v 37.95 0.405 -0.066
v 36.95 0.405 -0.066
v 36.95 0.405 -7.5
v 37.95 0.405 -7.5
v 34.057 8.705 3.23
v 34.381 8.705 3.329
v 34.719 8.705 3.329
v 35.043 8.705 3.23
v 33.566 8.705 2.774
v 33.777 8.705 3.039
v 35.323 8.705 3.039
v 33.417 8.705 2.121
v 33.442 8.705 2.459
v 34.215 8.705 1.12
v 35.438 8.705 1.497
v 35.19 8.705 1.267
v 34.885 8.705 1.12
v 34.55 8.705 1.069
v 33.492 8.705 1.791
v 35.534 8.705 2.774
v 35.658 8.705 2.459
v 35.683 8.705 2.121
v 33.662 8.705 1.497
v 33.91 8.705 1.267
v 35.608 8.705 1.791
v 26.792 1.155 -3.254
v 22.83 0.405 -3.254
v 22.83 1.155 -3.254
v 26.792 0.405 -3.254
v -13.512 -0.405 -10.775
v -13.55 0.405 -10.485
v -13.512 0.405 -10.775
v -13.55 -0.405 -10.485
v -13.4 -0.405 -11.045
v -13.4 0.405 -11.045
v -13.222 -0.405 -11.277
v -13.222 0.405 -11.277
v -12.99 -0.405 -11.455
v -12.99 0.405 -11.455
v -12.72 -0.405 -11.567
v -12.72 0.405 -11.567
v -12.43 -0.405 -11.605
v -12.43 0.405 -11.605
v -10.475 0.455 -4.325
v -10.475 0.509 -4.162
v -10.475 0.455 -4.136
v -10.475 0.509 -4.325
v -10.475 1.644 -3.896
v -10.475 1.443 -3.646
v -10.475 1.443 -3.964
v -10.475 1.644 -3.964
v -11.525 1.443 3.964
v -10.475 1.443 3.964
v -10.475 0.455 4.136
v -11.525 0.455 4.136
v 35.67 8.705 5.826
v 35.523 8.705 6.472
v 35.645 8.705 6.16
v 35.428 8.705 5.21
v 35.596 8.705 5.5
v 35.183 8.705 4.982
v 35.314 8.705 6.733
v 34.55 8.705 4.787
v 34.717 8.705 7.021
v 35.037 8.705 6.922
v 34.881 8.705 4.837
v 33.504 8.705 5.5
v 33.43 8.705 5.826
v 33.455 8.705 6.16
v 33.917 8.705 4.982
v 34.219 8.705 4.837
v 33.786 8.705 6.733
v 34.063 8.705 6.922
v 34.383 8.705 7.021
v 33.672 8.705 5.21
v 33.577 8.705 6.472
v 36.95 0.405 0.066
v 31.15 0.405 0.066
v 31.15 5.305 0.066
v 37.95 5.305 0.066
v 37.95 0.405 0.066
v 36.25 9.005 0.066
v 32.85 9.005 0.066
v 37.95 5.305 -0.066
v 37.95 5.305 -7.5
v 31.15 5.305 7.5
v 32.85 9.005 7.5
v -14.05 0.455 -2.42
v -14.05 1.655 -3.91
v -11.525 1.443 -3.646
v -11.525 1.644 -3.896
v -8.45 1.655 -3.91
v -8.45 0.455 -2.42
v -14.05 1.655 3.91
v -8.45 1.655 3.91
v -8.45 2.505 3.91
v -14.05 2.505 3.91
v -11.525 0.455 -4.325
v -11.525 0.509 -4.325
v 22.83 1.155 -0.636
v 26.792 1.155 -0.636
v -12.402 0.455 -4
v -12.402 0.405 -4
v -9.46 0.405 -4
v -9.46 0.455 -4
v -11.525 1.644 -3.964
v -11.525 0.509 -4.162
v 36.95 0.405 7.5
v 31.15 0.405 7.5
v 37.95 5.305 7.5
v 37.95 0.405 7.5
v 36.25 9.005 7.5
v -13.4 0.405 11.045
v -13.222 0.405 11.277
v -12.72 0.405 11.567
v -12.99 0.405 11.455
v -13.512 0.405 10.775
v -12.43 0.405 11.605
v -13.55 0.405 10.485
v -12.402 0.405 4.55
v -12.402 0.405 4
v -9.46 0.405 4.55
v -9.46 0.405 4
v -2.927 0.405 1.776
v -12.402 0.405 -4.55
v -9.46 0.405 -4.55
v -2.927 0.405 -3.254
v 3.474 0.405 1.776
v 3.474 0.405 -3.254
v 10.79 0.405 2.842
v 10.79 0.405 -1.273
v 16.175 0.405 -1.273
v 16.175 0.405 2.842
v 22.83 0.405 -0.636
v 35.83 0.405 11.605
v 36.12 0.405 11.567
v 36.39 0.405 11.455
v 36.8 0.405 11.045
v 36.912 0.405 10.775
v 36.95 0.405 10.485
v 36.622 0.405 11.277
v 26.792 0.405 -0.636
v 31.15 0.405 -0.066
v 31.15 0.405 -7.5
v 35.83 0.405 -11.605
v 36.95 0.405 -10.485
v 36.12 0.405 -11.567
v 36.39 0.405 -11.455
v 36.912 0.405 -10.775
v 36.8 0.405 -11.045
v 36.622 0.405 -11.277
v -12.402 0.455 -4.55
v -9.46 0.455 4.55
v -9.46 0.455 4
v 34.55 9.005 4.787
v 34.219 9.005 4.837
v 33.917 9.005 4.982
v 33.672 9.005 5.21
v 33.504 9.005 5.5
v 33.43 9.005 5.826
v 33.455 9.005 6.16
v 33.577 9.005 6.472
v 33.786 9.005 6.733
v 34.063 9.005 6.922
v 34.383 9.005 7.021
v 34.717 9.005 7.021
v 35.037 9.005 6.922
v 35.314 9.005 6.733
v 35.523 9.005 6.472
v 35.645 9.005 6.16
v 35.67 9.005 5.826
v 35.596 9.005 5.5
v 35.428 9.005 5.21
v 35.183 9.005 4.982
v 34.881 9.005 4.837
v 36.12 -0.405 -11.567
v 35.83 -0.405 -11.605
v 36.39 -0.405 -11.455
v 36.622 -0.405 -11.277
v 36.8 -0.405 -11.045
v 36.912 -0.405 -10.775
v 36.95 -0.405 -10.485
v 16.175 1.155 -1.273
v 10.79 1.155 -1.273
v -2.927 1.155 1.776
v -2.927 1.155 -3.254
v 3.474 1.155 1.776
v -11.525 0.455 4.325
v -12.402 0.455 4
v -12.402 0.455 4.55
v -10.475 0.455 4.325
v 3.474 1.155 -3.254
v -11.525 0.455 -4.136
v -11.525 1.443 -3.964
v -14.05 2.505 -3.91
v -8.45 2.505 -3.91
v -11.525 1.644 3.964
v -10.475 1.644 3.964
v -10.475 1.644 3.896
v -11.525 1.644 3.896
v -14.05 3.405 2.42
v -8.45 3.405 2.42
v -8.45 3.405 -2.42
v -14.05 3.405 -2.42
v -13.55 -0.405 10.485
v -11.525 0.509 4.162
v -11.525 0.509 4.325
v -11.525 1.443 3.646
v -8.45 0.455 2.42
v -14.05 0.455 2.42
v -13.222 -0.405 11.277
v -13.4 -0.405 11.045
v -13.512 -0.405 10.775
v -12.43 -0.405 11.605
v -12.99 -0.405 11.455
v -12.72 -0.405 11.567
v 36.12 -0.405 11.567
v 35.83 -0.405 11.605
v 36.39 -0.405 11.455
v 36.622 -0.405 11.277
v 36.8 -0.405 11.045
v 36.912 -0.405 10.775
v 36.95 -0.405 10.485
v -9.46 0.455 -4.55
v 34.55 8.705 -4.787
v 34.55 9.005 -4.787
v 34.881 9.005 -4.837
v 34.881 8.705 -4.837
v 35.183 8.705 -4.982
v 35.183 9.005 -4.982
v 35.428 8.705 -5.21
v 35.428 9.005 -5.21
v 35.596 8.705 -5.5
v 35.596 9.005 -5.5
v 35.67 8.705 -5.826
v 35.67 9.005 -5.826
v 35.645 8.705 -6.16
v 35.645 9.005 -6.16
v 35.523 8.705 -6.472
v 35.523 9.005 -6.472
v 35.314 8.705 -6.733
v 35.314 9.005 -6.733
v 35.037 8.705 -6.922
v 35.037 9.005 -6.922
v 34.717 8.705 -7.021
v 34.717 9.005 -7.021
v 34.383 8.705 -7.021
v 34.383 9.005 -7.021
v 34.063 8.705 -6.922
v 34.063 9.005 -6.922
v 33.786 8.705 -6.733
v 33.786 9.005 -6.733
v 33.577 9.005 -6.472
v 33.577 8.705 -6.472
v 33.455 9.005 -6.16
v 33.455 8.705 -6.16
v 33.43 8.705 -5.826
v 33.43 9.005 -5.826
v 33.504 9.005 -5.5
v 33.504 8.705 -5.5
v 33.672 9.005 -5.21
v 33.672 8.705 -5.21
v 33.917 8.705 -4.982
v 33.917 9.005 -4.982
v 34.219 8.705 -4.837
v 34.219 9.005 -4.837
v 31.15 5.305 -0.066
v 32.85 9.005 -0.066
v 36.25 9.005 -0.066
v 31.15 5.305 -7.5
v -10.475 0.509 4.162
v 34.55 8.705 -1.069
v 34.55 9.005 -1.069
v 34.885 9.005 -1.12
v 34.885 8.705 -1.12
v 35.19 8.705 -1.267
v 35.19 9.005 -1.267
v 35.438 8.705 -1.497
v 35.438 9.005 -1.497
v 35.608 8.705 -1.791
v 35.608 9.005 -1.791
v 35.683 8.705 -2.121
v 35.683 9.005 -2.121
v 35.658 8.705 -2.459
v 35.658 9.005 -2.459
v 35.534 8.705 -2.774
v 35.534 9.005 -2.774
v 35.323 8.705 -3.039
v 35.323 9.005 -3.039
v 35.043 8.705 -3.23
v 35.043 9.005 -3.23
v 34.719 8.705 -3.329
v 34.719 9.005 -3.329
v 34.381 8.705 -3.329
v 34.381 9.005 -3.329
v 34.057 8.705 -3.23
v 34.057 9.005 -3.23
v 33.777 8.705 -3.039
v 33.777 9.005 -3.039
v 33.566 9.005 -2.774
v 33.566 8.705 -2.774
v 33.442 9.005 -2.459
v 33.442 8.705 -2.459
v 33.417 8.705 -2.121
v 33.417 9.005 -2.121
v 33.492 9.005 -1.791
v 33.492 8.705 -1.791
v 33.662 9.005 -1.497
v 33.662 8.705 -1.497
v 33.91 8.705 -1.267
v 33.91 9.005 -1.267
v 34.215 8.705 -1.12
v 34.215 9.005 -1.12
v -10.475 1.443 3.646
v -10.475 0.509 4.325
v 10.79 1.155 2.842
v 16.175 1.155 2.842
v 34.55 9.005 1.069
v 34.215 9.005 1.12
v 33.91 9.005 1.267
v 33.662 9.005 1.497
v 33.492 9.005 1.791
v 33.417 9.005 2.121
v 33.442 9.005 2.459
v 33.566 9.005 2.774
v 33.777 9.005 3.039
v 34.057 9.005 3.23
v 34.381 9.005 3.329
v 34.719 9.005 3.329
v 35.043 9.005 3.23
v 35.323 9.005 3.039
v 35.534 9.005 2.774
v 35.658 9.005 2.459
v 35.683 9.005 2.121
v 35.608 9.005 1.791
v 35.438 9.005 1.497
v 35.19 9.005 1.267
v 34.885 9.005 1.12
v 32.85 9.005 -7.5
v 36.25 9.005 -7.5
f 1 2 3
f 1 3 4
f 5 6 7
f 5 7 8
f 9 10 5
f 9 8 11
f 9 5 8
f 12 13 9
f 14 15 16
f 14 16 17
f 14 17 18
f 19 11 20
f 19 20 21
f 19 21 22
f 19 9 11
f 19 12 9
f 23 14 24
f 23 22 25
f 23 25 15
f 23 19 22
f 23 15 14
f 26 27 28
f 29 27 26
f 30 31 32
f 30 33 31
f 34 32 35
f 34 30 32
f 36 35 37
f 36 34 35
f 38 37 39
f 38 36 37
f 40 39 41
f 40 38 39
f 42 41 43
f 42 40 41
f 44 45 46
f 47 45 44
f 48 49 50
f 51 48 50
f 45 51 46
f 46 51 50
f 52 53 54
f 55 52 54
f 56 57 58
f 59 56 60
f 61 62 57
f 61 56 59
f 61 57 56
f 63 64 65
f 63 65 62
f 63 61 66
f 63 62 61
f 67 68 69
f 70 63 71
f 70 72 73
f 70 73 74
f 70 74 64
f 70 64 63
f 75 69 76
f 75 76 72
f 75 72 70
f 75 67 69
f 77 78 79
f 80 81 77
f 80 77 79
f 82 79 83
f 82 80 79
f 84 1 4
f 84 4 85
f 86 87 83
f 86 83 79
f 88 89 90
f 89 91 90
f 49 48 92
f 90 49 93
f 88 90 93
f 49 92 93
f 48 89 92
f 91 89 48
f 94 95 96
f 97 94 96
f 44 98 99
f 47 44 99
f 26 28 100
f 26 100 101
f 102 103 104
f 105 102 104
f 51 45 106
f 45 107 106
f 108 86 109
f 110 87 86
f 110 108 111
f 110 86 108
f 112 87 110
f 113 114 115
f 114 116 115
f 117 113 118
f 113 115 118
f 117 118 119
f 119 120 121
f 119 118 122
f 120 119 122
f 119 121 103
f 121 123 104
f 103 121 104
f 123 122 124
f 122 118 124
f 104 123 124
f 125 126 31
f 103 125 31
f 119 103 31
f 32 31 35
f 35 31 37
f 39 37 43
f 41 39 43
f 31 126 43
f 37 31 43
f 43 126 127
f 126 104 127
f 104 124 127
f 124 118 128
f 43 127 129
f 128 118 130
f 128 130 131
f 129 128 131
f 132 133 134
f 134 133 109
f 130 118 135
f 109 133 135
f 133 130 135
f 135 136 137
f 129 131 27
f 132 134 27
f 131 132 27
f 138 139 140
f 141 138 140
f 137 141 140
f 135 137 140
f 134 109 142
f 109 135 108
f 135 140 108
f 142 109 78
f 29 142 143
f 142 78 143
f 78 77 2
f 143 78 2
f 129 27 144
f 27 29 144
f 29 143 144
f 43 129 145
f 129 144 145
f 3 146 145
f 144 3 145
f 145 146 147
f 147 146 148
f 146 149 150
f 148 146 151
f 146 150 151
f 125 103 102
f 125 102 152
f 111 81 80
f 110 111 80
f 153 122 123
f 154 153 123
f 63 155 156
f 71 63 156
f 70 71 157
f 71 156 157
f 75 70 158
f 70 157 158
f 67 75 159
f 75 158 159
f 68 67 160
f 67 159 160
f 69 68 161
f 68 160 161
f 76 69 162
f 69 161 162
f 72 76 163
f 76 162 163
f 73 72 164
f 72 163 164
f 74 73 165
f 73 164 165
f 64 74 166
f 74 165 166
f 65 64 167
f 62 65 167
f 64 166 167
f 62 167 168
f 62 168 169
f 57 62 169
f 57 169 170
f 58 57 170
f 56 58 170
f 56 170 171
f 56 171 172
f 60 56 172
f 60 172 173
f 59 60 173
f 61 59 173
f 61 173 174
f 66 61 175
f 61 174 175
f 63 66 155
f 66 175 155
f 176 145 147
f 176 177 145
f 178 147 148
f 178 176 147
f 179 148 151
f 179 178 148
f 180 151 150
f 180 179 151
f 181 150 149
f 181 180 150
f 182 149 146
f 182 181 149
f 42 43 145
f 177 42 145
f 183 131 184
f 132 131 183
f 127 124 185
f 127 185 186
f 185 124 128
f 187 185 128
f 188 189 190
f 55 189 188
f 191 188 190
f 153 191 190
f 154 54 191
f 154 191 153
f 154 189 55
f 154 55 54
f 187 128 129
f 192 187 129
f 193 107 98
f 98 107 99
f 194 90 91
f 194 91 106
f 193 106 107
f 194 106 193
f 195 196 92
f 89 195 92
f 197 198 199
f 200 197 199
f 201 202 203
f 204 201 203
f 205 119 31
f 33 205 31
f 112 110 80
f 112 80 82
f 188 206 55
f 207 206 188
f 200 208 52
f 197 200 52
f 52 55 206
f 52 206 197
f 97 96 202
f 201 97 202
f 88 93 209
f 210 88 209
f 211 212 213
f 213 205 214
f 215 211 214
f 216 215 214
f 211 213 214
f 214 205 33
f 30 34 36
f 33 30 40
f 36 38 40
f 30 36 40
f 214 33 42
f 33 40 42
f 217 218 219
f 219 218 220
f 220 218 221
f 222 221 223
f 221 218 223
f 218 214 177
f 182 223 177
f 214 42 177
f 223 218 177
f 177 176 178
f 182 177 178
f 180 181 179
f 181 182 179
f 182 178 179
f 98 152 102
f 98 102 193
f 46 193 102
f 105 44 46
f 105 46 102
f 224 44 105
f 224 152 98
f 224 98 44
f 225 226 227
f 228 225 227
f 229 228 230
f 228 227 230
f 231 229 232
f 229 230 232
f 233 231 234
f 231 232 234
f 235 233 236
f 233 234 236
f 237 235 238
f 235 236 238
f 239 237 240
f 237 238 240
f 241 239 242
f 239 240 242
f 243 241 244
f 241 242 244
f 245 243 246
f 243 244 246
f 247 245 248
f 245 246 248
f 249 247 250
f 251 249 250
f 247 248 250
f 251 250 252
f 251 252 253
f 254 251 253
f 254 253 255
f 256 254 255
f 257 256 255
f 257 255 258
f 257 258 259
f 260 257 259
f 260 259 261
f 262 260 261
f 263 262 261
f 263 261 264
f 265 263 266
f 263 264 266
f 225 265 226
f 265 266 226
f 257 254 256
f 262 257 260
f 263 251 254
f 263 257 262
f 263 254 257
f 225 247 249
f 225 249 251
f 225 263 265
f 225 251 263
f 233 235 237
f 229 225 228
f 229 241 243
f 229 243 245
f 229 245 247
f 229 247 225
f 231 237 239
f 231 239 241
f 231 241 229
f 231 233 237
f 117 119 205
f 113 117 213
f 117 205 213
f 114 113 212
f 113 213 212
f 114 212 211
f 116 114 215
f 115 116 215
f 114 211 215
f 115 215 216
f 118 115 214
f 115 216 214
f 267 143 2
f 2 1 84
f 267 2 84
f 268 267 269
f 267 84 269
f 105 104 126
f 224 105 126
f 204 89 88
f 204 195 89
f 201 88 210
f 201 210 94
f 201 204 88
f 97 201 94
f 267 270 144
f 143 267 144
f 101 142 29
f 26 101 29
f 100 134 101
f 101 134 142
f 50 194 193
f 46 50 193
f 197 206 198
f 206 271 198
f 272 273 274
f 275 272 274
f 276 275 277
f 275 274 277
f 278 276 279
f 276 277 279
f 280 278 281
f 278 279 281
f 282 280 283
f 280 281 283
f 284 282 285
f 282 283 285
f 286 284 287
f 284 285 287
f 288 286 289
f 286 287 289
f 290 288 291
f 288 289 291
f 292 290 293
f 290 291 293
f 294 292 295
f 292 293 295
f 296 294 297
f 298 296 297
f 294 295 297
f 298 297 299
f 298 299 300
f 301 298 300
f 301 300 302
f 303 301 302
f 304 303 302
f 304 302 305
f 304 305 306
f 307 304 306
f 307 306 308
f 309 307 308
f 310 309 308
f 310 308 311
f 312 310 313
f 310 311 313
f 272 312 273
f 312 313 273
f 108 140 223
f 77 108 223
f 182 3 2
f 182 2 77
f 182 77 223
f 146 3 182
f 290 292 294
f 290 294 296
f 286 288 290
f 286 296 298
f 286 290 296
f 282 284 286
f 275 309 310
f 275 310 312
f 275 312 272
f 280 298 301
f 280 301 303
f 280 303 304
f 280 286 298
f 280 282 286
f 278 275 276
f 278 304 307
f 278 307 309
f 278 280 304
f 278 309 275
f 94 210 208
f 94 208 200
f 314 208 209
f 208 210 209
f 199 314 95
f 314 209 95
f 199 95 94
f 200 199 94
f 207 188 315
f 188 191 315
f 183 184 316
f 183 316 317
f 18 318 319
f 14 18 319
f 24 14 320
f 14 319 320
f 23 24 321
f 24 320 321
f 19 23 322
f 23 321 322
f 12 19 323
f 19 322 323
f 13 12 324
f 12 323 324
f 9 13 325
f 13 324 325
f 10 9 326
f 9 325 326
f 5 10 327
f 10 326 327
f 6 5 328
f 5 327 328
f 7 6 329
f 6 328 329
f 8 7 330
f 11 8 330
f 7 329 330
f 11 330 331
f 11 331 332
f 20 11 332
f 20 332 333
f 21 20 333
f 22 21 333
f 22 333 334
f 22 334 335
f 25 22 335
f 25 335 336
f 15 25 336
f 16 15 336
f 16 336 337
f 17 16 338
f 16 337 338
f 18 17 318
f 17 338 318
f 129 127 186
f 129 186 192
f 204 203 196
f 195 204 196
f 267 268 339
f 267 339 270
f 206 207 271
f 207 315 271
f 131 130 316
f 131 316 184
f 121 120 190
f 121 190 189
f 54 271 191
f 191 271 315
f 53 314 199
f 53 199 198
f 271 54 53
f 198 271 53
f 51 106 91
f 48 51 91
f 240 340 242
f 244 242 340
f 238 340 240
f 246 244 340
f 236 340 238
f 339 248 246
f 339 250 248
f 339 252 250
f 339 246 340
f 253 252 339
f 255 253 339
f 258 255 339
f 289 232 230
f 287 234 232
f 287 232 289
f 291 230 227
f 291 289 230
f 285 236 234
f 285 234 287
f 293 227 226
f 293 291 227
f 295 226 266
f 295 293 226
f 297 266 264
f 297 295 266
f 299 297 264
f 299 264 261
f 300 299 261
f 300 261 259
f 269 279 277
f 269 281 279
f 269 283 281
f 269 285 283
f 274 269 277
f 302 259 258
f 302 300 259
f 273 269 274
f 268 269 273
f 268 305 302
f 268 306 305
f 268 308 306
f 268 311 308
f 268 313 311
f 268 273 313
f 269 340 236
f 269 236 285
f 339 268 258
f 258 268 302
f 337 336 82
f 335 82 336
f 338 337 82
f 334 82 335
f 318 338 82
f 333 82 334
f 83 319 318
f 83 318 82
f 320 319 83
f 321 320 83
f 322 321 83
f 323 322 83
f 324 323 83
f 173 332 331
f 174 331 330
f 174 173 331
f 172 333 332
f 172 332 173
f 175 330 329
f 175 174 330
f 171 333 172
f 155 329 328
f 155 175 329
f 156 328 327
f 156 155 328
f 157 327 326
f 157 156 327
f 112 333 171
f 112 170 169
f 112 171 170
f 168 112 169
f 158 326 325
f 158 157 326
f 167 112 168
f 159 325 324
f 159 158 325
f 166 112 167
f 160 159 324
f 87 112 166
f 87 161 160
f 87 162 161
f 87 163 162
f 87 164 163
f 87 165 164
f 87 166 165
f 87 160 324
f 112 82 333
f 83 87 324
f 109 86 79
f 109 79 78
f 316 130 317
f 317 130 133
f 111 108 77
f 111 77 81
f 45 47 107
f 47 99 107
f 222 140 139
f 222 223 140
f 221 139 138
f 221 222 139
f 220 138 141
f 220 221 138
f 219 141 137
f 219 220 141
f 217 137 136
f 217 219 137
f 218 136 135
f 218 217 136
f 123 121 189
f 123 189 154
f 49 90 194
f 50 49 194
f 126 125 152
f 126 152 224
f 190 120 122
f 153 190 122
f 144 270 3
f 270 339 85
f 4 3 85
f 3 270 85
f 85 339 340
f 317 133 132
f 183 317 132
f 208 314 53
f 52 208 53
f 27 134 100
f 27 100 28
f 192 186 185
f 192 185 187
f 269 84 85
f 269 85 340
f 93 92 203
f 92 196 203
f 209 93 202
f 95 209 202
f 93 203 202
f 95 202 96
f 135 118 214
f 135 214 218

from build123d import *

# Parameters (mm, degrees)
BOSS_EXTRUDE1_DEPTH      = 0.405
FILLET1_R                = 1.12
CHAMFER1_SIZE            = 0.5
SKETCH2_R                = 1.1
CUT_EXTRUDE1_DEPTH       = 16.574075414
BOSS_EXTRUDE2_DEPTH      = 0.5
BOSS_EXTRUDE2_DEPTH_BACK = 5.1
SKETCH4_W                = 2.941717286
SKETCH4_H                = 0.549853698
BOSS_EXTRUDE3_DEPTH      = 0.05
BOSS_EXTRUDE4_DEPTH      = 0.525
SKETCH6_R                = 0.577649515
CUT_EXTRUDE2_DEPTH       = 17.26947218
SKETCH7_W                = 50.5
SKETCH7_H                = 23.21
BOSS_EXTRUDE5_DEPTH      = 0.81
FILLET2_R                = 1.12
SKETCH8_W                = 6.401014247
SKETCH8_H                = 5.029368337
SKETCH8_W_2              = 5.38498024
SKETCH8_H_2              = 4.114937731
SKETCH8_W_3              = 3.96253263
SKETCH8_H_3              = 2.617558371
BOSS_EXTRUDE6_DEPTH      = 0.75
BOSS_EXTRUDE7_DEPTH      = 7.5
SKETCH10_W               = 0.132636096
SKETCH10_H               = 11.074362277
CUT_EXTRUDE3_DEPTH       = 6.8
SKETCH11_R               = 1.123282604
SKETCH11_R_2             = 1.136386451
CUT_EXTRUDE4_DEPTH       = 0.3


with BuildPart() as part:
    # Sketch1 → Boss-Extrude1 (new, symmetric)
    with BuildSketch(Plane(origin=(0, 0, 0), x_dir=(1, 0, 0), z_dir=(0, 1, 0))):
        Polygon((-13.55, 7.635), (11.83, 7.635), (11.83, 3.675), (13.55, 2.295), (13.55, -2.295), (11.83, -3.675), (11.83, -7.635), (-13.55, -7.635), align=None)
    extrude(amount=BOSS_EXTRUDE1_DEPTH, both=True)

    # Fillet1
    fillet1_edges = [part.edges().sort_by_distance(p)[0] for p in [
        (-13.55, 0, -7.635),
        (-13.55, 0, 7.635),
    ]]
    fillet(fillet1_edges, radius=FILLET1_R)

    # Chamfer1
    chamfer1_edges = [part.edges().sort_by_distance(p)[0] for p in [
        (11.83, 0, -7.635),
        (11.83, 0, 7.635),
    ]]
    chamfer(chamfer1_edges, length=CHAMFER1_SIZE)

    # Sketch2 → Cut-Extrude1 (cut, through all)
    with BuildSketch(Plane(origin=(0, 0.405, 0), x_dir=(1, 0, 0), z_dir=(0, 1, 0))):
        with Locations(Location((9.57, 5.74, 0), (0, 0, 270))):
            Circle(SKETCH2_R)
        with Locations(Location((9.57, -5.74, 0), (0, 0, 270))):
            Circle(SKETCH2_R)
    extrude(amount=-CUT_EXTRUDE1_DEPTH, mode=Mode.SUBTRACT)

    # Sketch4 → Boss-Extrude3 (add)
    with BuildSketch(Plane(origin=(0, 0.405, 0), x_dir=(1, 0, 0), z_dir=(0, 1, 0))):
        with Locations((-10.930908088, 4.275112504)):
            Rectangle(SKETCH4_W, SKETCH4_H)
        with Locations((-10.930908088, -4.275112504)):
            Rectangle(SKETCH4_W, SKETCH4_H)
    extrude(amount=BOSS_EXTRUDE3_DEPTH)



with BuildPart() as body_2:
    # Sketch3 → Boss-Extrude2 (new, two sides: drawn at the far end of the back side and taken through both)
    with BuildSketch(Plane.ZY.offset(13.55).offset(-BOSS_EXTRUDE2_DEPTH_BACK)):
        Polygon((-3.91, 1.655), (-2.42, 0.455), (2.42, 0.455), (3.91, 1.655), (3.91, 2.505), (2.42, 3.405), (-2.42, 3.405), (-3.91, 2.505), align=None)
    extrude(amount=BOSS_EXTRUDE2_DEPTH + BOSS_EXTRUDE2_DEPTH_BACK)


with BuildPart() as part_1:
    add(part.part)

    add(body_2.part)  # Boss-Extrude4 merges body 2
    # Sketch5 → Boss-Extrude4 (add, symmetric)
    with BuildSketch(Plane(origin=(-11, 0, 0), x_dir=(0, 0, -1), z_dir=(1, 0, 0))):
        Polygon((4.325381098, 0.455), (4.325381098, 0.509426612), (4.162105788, 0.509426612), (3.964358919, 1.644096311), (3.498388432, 1.644096311), (3.498388432, 1.44259556), (3.964358919, 1.44259556), (4.136474144, 0.455), align=None)
        Polygon((-4.136474144, 0.455), (-4.325381098, 0.455), (-4.325381098, 0.509426612), (-4.162105788, 0.509426612), (-3.964358919, 1.644096311), (-3.498388432, 1.644096311), (-3.498388432, 1.44259556), (-3.964358919, 1.44259556), align=None)
    extrude(amount=BOSS_EXTRUDE4_DEPTH, both=True)

    # Sketch6 → Cut-Extrude2 (cut, through all)
    with BuildSketch(Plane(origin=(0, 0.405, 0), x_dir=(1, 0, 0), z_dir=(0, 1, 0))):
        with Locations(Location((-5.985172419, 5.913658107, 0), (0, 0, 270))):
            Circle(SKETCH6_R)
        with Locations(Location((-3.485172419, 5.913658107, 0), (0, 0, 270))):
            Circle(SKETCH6_R)
        with Locations(Location((-0.985172419, 5.913658107, 0), (0, 0, 270))):
            Circle(SKETCH6_R)
        with Locations(Location((1.514827581, 5.913658107, 0), (0, 0, 270))):
            Circle(SKETCH6_R)
        with Locations(Location((4.014827581, 5.913658107, 0), (0, 0, 270))):
            Circle(SKETCH6_R)
        with Locations(Location((4.014827581, -5.913658107, 0), (0, 0, 90))):
            Circle(SKETCH6_R)
        with Locations(Location((1.514827581, -5.913658107, 0), (0, 0, 90))):
            Circle(SKETCH6_R)
        with Locations(Location((-0.985172419, -5.913658107, 0), (0, 0, 90))):
            Circle(SKETCH6_R)
        with Locations(Location((-3.485172419, -5.913658107, 0), (0, 0, 90))):
            Circle(SKETCH6_R)
        with Locations(Location((-5.985172419, -5.913658107, 0), (0, 0, 90))):
            Circle(SKETCH6_R)
    extrude(amount=-CUT_EXTRUDE2_DEPTH, mode=Mode.SUBTRACT)

    # Sketch7 → Boss-Extrude5 (add)
    with BuildSketch(Plane(origin=(0, 0.405, 0), x_dir=(1, 0, 0), z_dir=(0, 1, 0))):
        with Locations((11.7, 0)):
            Rectangle(SKETCH7_W, SKETCH7_H)
    extrude(amount=-BOSS_EXTRUDE5_DEPTH)

    # Fillet2
    fillet2_edges = [part_1.edges().sort_by_distance(p)[0] for p in [
        (-13.55, 0, 11.605),
        (-13.55, 0, -11.605),
        (36.95, 0, -11.605),
        (36.95, 0, 11.605),
    ]]
    fillet(fillet2_edges, radius=FILLET2_R)

    # Sketch8 → Boss-Extrude6 (add)
    with BuildSketch(Plane(origin=(0, 0.405, 0), x_dir=(1, 0, 0), z_dir=(0, 1, 0))):
        with Locations((0.273625917, 0.73916626)):
            Rectangle(SKETCH8_W, SKETCH8_H)
        with Locations((13.482068015, -0.784884752)):
            Rectangle(SKETCH8_W_2, SKETCH8_H_2)
        with Locations((24.8108472, 1.945071243)):
            Rectangle(SKETCH8_W_3, SKETCH8_H_3)
    extrude(amount=BOSS_EXTRUDE6_DEPTH)

    # Sketch9 → Boss-Extrude7 (add, symmetric)
    with BuildSketch(Plane.XY):
        Polygon((37.95, 0.405), (37.95, 5.305), (36.25, 9.005), (32.85, 9.005), (31.15, 5.305), (31.15, 0.405), align=None)
    extrude(amount=BOSS_EXTRUDE7_DEPTH, both=True)

    # Sketch10 → Cut-Extrude3 (cut)
    with BuildSketch(Plane(origin=(37.95, 0, 0), x_dir=(0, 0, -1), z_dir=(1, 0, 0))):
        with Locations((0, 5.942181138)):
            Rectangle(SKETCH10_W, SKETCH10_H)
    extrude(amount=-CUT_EXTRUDE3_DEPTH, mode=Mode.SUBTRACT)

    # Sketch11 → Cut-Extrude4 (cut)
    with BuildSketch(Plane(origin=(0, 9.005, 0), x_dir=(1, 0, 0), z_dir=(0, 1, 0))):
        with Locations(Location((34.55, 5.910055159, 0), (0, 0, 270))):
            Circle(SKETCH11_R)
        with Locations(Location((34.55, 2.205678961, 0), (0, 0, 270))):
            Circle(SKETCH11_R_2)
        with Locations(Location((34.55, -2.205678961, 0), (0, 0, 90))):
            Circle(SKETCH11_R_2)
        with Locations(Location((34.55, -5.910055159, 0), (0, 0, 90))):
            Circle(SKETCH11_R)
    extrude(amount=-CUT_EXTRUDE4_DEPTH, mode=Mode.SUBTRACT)


solid = part_1.part
